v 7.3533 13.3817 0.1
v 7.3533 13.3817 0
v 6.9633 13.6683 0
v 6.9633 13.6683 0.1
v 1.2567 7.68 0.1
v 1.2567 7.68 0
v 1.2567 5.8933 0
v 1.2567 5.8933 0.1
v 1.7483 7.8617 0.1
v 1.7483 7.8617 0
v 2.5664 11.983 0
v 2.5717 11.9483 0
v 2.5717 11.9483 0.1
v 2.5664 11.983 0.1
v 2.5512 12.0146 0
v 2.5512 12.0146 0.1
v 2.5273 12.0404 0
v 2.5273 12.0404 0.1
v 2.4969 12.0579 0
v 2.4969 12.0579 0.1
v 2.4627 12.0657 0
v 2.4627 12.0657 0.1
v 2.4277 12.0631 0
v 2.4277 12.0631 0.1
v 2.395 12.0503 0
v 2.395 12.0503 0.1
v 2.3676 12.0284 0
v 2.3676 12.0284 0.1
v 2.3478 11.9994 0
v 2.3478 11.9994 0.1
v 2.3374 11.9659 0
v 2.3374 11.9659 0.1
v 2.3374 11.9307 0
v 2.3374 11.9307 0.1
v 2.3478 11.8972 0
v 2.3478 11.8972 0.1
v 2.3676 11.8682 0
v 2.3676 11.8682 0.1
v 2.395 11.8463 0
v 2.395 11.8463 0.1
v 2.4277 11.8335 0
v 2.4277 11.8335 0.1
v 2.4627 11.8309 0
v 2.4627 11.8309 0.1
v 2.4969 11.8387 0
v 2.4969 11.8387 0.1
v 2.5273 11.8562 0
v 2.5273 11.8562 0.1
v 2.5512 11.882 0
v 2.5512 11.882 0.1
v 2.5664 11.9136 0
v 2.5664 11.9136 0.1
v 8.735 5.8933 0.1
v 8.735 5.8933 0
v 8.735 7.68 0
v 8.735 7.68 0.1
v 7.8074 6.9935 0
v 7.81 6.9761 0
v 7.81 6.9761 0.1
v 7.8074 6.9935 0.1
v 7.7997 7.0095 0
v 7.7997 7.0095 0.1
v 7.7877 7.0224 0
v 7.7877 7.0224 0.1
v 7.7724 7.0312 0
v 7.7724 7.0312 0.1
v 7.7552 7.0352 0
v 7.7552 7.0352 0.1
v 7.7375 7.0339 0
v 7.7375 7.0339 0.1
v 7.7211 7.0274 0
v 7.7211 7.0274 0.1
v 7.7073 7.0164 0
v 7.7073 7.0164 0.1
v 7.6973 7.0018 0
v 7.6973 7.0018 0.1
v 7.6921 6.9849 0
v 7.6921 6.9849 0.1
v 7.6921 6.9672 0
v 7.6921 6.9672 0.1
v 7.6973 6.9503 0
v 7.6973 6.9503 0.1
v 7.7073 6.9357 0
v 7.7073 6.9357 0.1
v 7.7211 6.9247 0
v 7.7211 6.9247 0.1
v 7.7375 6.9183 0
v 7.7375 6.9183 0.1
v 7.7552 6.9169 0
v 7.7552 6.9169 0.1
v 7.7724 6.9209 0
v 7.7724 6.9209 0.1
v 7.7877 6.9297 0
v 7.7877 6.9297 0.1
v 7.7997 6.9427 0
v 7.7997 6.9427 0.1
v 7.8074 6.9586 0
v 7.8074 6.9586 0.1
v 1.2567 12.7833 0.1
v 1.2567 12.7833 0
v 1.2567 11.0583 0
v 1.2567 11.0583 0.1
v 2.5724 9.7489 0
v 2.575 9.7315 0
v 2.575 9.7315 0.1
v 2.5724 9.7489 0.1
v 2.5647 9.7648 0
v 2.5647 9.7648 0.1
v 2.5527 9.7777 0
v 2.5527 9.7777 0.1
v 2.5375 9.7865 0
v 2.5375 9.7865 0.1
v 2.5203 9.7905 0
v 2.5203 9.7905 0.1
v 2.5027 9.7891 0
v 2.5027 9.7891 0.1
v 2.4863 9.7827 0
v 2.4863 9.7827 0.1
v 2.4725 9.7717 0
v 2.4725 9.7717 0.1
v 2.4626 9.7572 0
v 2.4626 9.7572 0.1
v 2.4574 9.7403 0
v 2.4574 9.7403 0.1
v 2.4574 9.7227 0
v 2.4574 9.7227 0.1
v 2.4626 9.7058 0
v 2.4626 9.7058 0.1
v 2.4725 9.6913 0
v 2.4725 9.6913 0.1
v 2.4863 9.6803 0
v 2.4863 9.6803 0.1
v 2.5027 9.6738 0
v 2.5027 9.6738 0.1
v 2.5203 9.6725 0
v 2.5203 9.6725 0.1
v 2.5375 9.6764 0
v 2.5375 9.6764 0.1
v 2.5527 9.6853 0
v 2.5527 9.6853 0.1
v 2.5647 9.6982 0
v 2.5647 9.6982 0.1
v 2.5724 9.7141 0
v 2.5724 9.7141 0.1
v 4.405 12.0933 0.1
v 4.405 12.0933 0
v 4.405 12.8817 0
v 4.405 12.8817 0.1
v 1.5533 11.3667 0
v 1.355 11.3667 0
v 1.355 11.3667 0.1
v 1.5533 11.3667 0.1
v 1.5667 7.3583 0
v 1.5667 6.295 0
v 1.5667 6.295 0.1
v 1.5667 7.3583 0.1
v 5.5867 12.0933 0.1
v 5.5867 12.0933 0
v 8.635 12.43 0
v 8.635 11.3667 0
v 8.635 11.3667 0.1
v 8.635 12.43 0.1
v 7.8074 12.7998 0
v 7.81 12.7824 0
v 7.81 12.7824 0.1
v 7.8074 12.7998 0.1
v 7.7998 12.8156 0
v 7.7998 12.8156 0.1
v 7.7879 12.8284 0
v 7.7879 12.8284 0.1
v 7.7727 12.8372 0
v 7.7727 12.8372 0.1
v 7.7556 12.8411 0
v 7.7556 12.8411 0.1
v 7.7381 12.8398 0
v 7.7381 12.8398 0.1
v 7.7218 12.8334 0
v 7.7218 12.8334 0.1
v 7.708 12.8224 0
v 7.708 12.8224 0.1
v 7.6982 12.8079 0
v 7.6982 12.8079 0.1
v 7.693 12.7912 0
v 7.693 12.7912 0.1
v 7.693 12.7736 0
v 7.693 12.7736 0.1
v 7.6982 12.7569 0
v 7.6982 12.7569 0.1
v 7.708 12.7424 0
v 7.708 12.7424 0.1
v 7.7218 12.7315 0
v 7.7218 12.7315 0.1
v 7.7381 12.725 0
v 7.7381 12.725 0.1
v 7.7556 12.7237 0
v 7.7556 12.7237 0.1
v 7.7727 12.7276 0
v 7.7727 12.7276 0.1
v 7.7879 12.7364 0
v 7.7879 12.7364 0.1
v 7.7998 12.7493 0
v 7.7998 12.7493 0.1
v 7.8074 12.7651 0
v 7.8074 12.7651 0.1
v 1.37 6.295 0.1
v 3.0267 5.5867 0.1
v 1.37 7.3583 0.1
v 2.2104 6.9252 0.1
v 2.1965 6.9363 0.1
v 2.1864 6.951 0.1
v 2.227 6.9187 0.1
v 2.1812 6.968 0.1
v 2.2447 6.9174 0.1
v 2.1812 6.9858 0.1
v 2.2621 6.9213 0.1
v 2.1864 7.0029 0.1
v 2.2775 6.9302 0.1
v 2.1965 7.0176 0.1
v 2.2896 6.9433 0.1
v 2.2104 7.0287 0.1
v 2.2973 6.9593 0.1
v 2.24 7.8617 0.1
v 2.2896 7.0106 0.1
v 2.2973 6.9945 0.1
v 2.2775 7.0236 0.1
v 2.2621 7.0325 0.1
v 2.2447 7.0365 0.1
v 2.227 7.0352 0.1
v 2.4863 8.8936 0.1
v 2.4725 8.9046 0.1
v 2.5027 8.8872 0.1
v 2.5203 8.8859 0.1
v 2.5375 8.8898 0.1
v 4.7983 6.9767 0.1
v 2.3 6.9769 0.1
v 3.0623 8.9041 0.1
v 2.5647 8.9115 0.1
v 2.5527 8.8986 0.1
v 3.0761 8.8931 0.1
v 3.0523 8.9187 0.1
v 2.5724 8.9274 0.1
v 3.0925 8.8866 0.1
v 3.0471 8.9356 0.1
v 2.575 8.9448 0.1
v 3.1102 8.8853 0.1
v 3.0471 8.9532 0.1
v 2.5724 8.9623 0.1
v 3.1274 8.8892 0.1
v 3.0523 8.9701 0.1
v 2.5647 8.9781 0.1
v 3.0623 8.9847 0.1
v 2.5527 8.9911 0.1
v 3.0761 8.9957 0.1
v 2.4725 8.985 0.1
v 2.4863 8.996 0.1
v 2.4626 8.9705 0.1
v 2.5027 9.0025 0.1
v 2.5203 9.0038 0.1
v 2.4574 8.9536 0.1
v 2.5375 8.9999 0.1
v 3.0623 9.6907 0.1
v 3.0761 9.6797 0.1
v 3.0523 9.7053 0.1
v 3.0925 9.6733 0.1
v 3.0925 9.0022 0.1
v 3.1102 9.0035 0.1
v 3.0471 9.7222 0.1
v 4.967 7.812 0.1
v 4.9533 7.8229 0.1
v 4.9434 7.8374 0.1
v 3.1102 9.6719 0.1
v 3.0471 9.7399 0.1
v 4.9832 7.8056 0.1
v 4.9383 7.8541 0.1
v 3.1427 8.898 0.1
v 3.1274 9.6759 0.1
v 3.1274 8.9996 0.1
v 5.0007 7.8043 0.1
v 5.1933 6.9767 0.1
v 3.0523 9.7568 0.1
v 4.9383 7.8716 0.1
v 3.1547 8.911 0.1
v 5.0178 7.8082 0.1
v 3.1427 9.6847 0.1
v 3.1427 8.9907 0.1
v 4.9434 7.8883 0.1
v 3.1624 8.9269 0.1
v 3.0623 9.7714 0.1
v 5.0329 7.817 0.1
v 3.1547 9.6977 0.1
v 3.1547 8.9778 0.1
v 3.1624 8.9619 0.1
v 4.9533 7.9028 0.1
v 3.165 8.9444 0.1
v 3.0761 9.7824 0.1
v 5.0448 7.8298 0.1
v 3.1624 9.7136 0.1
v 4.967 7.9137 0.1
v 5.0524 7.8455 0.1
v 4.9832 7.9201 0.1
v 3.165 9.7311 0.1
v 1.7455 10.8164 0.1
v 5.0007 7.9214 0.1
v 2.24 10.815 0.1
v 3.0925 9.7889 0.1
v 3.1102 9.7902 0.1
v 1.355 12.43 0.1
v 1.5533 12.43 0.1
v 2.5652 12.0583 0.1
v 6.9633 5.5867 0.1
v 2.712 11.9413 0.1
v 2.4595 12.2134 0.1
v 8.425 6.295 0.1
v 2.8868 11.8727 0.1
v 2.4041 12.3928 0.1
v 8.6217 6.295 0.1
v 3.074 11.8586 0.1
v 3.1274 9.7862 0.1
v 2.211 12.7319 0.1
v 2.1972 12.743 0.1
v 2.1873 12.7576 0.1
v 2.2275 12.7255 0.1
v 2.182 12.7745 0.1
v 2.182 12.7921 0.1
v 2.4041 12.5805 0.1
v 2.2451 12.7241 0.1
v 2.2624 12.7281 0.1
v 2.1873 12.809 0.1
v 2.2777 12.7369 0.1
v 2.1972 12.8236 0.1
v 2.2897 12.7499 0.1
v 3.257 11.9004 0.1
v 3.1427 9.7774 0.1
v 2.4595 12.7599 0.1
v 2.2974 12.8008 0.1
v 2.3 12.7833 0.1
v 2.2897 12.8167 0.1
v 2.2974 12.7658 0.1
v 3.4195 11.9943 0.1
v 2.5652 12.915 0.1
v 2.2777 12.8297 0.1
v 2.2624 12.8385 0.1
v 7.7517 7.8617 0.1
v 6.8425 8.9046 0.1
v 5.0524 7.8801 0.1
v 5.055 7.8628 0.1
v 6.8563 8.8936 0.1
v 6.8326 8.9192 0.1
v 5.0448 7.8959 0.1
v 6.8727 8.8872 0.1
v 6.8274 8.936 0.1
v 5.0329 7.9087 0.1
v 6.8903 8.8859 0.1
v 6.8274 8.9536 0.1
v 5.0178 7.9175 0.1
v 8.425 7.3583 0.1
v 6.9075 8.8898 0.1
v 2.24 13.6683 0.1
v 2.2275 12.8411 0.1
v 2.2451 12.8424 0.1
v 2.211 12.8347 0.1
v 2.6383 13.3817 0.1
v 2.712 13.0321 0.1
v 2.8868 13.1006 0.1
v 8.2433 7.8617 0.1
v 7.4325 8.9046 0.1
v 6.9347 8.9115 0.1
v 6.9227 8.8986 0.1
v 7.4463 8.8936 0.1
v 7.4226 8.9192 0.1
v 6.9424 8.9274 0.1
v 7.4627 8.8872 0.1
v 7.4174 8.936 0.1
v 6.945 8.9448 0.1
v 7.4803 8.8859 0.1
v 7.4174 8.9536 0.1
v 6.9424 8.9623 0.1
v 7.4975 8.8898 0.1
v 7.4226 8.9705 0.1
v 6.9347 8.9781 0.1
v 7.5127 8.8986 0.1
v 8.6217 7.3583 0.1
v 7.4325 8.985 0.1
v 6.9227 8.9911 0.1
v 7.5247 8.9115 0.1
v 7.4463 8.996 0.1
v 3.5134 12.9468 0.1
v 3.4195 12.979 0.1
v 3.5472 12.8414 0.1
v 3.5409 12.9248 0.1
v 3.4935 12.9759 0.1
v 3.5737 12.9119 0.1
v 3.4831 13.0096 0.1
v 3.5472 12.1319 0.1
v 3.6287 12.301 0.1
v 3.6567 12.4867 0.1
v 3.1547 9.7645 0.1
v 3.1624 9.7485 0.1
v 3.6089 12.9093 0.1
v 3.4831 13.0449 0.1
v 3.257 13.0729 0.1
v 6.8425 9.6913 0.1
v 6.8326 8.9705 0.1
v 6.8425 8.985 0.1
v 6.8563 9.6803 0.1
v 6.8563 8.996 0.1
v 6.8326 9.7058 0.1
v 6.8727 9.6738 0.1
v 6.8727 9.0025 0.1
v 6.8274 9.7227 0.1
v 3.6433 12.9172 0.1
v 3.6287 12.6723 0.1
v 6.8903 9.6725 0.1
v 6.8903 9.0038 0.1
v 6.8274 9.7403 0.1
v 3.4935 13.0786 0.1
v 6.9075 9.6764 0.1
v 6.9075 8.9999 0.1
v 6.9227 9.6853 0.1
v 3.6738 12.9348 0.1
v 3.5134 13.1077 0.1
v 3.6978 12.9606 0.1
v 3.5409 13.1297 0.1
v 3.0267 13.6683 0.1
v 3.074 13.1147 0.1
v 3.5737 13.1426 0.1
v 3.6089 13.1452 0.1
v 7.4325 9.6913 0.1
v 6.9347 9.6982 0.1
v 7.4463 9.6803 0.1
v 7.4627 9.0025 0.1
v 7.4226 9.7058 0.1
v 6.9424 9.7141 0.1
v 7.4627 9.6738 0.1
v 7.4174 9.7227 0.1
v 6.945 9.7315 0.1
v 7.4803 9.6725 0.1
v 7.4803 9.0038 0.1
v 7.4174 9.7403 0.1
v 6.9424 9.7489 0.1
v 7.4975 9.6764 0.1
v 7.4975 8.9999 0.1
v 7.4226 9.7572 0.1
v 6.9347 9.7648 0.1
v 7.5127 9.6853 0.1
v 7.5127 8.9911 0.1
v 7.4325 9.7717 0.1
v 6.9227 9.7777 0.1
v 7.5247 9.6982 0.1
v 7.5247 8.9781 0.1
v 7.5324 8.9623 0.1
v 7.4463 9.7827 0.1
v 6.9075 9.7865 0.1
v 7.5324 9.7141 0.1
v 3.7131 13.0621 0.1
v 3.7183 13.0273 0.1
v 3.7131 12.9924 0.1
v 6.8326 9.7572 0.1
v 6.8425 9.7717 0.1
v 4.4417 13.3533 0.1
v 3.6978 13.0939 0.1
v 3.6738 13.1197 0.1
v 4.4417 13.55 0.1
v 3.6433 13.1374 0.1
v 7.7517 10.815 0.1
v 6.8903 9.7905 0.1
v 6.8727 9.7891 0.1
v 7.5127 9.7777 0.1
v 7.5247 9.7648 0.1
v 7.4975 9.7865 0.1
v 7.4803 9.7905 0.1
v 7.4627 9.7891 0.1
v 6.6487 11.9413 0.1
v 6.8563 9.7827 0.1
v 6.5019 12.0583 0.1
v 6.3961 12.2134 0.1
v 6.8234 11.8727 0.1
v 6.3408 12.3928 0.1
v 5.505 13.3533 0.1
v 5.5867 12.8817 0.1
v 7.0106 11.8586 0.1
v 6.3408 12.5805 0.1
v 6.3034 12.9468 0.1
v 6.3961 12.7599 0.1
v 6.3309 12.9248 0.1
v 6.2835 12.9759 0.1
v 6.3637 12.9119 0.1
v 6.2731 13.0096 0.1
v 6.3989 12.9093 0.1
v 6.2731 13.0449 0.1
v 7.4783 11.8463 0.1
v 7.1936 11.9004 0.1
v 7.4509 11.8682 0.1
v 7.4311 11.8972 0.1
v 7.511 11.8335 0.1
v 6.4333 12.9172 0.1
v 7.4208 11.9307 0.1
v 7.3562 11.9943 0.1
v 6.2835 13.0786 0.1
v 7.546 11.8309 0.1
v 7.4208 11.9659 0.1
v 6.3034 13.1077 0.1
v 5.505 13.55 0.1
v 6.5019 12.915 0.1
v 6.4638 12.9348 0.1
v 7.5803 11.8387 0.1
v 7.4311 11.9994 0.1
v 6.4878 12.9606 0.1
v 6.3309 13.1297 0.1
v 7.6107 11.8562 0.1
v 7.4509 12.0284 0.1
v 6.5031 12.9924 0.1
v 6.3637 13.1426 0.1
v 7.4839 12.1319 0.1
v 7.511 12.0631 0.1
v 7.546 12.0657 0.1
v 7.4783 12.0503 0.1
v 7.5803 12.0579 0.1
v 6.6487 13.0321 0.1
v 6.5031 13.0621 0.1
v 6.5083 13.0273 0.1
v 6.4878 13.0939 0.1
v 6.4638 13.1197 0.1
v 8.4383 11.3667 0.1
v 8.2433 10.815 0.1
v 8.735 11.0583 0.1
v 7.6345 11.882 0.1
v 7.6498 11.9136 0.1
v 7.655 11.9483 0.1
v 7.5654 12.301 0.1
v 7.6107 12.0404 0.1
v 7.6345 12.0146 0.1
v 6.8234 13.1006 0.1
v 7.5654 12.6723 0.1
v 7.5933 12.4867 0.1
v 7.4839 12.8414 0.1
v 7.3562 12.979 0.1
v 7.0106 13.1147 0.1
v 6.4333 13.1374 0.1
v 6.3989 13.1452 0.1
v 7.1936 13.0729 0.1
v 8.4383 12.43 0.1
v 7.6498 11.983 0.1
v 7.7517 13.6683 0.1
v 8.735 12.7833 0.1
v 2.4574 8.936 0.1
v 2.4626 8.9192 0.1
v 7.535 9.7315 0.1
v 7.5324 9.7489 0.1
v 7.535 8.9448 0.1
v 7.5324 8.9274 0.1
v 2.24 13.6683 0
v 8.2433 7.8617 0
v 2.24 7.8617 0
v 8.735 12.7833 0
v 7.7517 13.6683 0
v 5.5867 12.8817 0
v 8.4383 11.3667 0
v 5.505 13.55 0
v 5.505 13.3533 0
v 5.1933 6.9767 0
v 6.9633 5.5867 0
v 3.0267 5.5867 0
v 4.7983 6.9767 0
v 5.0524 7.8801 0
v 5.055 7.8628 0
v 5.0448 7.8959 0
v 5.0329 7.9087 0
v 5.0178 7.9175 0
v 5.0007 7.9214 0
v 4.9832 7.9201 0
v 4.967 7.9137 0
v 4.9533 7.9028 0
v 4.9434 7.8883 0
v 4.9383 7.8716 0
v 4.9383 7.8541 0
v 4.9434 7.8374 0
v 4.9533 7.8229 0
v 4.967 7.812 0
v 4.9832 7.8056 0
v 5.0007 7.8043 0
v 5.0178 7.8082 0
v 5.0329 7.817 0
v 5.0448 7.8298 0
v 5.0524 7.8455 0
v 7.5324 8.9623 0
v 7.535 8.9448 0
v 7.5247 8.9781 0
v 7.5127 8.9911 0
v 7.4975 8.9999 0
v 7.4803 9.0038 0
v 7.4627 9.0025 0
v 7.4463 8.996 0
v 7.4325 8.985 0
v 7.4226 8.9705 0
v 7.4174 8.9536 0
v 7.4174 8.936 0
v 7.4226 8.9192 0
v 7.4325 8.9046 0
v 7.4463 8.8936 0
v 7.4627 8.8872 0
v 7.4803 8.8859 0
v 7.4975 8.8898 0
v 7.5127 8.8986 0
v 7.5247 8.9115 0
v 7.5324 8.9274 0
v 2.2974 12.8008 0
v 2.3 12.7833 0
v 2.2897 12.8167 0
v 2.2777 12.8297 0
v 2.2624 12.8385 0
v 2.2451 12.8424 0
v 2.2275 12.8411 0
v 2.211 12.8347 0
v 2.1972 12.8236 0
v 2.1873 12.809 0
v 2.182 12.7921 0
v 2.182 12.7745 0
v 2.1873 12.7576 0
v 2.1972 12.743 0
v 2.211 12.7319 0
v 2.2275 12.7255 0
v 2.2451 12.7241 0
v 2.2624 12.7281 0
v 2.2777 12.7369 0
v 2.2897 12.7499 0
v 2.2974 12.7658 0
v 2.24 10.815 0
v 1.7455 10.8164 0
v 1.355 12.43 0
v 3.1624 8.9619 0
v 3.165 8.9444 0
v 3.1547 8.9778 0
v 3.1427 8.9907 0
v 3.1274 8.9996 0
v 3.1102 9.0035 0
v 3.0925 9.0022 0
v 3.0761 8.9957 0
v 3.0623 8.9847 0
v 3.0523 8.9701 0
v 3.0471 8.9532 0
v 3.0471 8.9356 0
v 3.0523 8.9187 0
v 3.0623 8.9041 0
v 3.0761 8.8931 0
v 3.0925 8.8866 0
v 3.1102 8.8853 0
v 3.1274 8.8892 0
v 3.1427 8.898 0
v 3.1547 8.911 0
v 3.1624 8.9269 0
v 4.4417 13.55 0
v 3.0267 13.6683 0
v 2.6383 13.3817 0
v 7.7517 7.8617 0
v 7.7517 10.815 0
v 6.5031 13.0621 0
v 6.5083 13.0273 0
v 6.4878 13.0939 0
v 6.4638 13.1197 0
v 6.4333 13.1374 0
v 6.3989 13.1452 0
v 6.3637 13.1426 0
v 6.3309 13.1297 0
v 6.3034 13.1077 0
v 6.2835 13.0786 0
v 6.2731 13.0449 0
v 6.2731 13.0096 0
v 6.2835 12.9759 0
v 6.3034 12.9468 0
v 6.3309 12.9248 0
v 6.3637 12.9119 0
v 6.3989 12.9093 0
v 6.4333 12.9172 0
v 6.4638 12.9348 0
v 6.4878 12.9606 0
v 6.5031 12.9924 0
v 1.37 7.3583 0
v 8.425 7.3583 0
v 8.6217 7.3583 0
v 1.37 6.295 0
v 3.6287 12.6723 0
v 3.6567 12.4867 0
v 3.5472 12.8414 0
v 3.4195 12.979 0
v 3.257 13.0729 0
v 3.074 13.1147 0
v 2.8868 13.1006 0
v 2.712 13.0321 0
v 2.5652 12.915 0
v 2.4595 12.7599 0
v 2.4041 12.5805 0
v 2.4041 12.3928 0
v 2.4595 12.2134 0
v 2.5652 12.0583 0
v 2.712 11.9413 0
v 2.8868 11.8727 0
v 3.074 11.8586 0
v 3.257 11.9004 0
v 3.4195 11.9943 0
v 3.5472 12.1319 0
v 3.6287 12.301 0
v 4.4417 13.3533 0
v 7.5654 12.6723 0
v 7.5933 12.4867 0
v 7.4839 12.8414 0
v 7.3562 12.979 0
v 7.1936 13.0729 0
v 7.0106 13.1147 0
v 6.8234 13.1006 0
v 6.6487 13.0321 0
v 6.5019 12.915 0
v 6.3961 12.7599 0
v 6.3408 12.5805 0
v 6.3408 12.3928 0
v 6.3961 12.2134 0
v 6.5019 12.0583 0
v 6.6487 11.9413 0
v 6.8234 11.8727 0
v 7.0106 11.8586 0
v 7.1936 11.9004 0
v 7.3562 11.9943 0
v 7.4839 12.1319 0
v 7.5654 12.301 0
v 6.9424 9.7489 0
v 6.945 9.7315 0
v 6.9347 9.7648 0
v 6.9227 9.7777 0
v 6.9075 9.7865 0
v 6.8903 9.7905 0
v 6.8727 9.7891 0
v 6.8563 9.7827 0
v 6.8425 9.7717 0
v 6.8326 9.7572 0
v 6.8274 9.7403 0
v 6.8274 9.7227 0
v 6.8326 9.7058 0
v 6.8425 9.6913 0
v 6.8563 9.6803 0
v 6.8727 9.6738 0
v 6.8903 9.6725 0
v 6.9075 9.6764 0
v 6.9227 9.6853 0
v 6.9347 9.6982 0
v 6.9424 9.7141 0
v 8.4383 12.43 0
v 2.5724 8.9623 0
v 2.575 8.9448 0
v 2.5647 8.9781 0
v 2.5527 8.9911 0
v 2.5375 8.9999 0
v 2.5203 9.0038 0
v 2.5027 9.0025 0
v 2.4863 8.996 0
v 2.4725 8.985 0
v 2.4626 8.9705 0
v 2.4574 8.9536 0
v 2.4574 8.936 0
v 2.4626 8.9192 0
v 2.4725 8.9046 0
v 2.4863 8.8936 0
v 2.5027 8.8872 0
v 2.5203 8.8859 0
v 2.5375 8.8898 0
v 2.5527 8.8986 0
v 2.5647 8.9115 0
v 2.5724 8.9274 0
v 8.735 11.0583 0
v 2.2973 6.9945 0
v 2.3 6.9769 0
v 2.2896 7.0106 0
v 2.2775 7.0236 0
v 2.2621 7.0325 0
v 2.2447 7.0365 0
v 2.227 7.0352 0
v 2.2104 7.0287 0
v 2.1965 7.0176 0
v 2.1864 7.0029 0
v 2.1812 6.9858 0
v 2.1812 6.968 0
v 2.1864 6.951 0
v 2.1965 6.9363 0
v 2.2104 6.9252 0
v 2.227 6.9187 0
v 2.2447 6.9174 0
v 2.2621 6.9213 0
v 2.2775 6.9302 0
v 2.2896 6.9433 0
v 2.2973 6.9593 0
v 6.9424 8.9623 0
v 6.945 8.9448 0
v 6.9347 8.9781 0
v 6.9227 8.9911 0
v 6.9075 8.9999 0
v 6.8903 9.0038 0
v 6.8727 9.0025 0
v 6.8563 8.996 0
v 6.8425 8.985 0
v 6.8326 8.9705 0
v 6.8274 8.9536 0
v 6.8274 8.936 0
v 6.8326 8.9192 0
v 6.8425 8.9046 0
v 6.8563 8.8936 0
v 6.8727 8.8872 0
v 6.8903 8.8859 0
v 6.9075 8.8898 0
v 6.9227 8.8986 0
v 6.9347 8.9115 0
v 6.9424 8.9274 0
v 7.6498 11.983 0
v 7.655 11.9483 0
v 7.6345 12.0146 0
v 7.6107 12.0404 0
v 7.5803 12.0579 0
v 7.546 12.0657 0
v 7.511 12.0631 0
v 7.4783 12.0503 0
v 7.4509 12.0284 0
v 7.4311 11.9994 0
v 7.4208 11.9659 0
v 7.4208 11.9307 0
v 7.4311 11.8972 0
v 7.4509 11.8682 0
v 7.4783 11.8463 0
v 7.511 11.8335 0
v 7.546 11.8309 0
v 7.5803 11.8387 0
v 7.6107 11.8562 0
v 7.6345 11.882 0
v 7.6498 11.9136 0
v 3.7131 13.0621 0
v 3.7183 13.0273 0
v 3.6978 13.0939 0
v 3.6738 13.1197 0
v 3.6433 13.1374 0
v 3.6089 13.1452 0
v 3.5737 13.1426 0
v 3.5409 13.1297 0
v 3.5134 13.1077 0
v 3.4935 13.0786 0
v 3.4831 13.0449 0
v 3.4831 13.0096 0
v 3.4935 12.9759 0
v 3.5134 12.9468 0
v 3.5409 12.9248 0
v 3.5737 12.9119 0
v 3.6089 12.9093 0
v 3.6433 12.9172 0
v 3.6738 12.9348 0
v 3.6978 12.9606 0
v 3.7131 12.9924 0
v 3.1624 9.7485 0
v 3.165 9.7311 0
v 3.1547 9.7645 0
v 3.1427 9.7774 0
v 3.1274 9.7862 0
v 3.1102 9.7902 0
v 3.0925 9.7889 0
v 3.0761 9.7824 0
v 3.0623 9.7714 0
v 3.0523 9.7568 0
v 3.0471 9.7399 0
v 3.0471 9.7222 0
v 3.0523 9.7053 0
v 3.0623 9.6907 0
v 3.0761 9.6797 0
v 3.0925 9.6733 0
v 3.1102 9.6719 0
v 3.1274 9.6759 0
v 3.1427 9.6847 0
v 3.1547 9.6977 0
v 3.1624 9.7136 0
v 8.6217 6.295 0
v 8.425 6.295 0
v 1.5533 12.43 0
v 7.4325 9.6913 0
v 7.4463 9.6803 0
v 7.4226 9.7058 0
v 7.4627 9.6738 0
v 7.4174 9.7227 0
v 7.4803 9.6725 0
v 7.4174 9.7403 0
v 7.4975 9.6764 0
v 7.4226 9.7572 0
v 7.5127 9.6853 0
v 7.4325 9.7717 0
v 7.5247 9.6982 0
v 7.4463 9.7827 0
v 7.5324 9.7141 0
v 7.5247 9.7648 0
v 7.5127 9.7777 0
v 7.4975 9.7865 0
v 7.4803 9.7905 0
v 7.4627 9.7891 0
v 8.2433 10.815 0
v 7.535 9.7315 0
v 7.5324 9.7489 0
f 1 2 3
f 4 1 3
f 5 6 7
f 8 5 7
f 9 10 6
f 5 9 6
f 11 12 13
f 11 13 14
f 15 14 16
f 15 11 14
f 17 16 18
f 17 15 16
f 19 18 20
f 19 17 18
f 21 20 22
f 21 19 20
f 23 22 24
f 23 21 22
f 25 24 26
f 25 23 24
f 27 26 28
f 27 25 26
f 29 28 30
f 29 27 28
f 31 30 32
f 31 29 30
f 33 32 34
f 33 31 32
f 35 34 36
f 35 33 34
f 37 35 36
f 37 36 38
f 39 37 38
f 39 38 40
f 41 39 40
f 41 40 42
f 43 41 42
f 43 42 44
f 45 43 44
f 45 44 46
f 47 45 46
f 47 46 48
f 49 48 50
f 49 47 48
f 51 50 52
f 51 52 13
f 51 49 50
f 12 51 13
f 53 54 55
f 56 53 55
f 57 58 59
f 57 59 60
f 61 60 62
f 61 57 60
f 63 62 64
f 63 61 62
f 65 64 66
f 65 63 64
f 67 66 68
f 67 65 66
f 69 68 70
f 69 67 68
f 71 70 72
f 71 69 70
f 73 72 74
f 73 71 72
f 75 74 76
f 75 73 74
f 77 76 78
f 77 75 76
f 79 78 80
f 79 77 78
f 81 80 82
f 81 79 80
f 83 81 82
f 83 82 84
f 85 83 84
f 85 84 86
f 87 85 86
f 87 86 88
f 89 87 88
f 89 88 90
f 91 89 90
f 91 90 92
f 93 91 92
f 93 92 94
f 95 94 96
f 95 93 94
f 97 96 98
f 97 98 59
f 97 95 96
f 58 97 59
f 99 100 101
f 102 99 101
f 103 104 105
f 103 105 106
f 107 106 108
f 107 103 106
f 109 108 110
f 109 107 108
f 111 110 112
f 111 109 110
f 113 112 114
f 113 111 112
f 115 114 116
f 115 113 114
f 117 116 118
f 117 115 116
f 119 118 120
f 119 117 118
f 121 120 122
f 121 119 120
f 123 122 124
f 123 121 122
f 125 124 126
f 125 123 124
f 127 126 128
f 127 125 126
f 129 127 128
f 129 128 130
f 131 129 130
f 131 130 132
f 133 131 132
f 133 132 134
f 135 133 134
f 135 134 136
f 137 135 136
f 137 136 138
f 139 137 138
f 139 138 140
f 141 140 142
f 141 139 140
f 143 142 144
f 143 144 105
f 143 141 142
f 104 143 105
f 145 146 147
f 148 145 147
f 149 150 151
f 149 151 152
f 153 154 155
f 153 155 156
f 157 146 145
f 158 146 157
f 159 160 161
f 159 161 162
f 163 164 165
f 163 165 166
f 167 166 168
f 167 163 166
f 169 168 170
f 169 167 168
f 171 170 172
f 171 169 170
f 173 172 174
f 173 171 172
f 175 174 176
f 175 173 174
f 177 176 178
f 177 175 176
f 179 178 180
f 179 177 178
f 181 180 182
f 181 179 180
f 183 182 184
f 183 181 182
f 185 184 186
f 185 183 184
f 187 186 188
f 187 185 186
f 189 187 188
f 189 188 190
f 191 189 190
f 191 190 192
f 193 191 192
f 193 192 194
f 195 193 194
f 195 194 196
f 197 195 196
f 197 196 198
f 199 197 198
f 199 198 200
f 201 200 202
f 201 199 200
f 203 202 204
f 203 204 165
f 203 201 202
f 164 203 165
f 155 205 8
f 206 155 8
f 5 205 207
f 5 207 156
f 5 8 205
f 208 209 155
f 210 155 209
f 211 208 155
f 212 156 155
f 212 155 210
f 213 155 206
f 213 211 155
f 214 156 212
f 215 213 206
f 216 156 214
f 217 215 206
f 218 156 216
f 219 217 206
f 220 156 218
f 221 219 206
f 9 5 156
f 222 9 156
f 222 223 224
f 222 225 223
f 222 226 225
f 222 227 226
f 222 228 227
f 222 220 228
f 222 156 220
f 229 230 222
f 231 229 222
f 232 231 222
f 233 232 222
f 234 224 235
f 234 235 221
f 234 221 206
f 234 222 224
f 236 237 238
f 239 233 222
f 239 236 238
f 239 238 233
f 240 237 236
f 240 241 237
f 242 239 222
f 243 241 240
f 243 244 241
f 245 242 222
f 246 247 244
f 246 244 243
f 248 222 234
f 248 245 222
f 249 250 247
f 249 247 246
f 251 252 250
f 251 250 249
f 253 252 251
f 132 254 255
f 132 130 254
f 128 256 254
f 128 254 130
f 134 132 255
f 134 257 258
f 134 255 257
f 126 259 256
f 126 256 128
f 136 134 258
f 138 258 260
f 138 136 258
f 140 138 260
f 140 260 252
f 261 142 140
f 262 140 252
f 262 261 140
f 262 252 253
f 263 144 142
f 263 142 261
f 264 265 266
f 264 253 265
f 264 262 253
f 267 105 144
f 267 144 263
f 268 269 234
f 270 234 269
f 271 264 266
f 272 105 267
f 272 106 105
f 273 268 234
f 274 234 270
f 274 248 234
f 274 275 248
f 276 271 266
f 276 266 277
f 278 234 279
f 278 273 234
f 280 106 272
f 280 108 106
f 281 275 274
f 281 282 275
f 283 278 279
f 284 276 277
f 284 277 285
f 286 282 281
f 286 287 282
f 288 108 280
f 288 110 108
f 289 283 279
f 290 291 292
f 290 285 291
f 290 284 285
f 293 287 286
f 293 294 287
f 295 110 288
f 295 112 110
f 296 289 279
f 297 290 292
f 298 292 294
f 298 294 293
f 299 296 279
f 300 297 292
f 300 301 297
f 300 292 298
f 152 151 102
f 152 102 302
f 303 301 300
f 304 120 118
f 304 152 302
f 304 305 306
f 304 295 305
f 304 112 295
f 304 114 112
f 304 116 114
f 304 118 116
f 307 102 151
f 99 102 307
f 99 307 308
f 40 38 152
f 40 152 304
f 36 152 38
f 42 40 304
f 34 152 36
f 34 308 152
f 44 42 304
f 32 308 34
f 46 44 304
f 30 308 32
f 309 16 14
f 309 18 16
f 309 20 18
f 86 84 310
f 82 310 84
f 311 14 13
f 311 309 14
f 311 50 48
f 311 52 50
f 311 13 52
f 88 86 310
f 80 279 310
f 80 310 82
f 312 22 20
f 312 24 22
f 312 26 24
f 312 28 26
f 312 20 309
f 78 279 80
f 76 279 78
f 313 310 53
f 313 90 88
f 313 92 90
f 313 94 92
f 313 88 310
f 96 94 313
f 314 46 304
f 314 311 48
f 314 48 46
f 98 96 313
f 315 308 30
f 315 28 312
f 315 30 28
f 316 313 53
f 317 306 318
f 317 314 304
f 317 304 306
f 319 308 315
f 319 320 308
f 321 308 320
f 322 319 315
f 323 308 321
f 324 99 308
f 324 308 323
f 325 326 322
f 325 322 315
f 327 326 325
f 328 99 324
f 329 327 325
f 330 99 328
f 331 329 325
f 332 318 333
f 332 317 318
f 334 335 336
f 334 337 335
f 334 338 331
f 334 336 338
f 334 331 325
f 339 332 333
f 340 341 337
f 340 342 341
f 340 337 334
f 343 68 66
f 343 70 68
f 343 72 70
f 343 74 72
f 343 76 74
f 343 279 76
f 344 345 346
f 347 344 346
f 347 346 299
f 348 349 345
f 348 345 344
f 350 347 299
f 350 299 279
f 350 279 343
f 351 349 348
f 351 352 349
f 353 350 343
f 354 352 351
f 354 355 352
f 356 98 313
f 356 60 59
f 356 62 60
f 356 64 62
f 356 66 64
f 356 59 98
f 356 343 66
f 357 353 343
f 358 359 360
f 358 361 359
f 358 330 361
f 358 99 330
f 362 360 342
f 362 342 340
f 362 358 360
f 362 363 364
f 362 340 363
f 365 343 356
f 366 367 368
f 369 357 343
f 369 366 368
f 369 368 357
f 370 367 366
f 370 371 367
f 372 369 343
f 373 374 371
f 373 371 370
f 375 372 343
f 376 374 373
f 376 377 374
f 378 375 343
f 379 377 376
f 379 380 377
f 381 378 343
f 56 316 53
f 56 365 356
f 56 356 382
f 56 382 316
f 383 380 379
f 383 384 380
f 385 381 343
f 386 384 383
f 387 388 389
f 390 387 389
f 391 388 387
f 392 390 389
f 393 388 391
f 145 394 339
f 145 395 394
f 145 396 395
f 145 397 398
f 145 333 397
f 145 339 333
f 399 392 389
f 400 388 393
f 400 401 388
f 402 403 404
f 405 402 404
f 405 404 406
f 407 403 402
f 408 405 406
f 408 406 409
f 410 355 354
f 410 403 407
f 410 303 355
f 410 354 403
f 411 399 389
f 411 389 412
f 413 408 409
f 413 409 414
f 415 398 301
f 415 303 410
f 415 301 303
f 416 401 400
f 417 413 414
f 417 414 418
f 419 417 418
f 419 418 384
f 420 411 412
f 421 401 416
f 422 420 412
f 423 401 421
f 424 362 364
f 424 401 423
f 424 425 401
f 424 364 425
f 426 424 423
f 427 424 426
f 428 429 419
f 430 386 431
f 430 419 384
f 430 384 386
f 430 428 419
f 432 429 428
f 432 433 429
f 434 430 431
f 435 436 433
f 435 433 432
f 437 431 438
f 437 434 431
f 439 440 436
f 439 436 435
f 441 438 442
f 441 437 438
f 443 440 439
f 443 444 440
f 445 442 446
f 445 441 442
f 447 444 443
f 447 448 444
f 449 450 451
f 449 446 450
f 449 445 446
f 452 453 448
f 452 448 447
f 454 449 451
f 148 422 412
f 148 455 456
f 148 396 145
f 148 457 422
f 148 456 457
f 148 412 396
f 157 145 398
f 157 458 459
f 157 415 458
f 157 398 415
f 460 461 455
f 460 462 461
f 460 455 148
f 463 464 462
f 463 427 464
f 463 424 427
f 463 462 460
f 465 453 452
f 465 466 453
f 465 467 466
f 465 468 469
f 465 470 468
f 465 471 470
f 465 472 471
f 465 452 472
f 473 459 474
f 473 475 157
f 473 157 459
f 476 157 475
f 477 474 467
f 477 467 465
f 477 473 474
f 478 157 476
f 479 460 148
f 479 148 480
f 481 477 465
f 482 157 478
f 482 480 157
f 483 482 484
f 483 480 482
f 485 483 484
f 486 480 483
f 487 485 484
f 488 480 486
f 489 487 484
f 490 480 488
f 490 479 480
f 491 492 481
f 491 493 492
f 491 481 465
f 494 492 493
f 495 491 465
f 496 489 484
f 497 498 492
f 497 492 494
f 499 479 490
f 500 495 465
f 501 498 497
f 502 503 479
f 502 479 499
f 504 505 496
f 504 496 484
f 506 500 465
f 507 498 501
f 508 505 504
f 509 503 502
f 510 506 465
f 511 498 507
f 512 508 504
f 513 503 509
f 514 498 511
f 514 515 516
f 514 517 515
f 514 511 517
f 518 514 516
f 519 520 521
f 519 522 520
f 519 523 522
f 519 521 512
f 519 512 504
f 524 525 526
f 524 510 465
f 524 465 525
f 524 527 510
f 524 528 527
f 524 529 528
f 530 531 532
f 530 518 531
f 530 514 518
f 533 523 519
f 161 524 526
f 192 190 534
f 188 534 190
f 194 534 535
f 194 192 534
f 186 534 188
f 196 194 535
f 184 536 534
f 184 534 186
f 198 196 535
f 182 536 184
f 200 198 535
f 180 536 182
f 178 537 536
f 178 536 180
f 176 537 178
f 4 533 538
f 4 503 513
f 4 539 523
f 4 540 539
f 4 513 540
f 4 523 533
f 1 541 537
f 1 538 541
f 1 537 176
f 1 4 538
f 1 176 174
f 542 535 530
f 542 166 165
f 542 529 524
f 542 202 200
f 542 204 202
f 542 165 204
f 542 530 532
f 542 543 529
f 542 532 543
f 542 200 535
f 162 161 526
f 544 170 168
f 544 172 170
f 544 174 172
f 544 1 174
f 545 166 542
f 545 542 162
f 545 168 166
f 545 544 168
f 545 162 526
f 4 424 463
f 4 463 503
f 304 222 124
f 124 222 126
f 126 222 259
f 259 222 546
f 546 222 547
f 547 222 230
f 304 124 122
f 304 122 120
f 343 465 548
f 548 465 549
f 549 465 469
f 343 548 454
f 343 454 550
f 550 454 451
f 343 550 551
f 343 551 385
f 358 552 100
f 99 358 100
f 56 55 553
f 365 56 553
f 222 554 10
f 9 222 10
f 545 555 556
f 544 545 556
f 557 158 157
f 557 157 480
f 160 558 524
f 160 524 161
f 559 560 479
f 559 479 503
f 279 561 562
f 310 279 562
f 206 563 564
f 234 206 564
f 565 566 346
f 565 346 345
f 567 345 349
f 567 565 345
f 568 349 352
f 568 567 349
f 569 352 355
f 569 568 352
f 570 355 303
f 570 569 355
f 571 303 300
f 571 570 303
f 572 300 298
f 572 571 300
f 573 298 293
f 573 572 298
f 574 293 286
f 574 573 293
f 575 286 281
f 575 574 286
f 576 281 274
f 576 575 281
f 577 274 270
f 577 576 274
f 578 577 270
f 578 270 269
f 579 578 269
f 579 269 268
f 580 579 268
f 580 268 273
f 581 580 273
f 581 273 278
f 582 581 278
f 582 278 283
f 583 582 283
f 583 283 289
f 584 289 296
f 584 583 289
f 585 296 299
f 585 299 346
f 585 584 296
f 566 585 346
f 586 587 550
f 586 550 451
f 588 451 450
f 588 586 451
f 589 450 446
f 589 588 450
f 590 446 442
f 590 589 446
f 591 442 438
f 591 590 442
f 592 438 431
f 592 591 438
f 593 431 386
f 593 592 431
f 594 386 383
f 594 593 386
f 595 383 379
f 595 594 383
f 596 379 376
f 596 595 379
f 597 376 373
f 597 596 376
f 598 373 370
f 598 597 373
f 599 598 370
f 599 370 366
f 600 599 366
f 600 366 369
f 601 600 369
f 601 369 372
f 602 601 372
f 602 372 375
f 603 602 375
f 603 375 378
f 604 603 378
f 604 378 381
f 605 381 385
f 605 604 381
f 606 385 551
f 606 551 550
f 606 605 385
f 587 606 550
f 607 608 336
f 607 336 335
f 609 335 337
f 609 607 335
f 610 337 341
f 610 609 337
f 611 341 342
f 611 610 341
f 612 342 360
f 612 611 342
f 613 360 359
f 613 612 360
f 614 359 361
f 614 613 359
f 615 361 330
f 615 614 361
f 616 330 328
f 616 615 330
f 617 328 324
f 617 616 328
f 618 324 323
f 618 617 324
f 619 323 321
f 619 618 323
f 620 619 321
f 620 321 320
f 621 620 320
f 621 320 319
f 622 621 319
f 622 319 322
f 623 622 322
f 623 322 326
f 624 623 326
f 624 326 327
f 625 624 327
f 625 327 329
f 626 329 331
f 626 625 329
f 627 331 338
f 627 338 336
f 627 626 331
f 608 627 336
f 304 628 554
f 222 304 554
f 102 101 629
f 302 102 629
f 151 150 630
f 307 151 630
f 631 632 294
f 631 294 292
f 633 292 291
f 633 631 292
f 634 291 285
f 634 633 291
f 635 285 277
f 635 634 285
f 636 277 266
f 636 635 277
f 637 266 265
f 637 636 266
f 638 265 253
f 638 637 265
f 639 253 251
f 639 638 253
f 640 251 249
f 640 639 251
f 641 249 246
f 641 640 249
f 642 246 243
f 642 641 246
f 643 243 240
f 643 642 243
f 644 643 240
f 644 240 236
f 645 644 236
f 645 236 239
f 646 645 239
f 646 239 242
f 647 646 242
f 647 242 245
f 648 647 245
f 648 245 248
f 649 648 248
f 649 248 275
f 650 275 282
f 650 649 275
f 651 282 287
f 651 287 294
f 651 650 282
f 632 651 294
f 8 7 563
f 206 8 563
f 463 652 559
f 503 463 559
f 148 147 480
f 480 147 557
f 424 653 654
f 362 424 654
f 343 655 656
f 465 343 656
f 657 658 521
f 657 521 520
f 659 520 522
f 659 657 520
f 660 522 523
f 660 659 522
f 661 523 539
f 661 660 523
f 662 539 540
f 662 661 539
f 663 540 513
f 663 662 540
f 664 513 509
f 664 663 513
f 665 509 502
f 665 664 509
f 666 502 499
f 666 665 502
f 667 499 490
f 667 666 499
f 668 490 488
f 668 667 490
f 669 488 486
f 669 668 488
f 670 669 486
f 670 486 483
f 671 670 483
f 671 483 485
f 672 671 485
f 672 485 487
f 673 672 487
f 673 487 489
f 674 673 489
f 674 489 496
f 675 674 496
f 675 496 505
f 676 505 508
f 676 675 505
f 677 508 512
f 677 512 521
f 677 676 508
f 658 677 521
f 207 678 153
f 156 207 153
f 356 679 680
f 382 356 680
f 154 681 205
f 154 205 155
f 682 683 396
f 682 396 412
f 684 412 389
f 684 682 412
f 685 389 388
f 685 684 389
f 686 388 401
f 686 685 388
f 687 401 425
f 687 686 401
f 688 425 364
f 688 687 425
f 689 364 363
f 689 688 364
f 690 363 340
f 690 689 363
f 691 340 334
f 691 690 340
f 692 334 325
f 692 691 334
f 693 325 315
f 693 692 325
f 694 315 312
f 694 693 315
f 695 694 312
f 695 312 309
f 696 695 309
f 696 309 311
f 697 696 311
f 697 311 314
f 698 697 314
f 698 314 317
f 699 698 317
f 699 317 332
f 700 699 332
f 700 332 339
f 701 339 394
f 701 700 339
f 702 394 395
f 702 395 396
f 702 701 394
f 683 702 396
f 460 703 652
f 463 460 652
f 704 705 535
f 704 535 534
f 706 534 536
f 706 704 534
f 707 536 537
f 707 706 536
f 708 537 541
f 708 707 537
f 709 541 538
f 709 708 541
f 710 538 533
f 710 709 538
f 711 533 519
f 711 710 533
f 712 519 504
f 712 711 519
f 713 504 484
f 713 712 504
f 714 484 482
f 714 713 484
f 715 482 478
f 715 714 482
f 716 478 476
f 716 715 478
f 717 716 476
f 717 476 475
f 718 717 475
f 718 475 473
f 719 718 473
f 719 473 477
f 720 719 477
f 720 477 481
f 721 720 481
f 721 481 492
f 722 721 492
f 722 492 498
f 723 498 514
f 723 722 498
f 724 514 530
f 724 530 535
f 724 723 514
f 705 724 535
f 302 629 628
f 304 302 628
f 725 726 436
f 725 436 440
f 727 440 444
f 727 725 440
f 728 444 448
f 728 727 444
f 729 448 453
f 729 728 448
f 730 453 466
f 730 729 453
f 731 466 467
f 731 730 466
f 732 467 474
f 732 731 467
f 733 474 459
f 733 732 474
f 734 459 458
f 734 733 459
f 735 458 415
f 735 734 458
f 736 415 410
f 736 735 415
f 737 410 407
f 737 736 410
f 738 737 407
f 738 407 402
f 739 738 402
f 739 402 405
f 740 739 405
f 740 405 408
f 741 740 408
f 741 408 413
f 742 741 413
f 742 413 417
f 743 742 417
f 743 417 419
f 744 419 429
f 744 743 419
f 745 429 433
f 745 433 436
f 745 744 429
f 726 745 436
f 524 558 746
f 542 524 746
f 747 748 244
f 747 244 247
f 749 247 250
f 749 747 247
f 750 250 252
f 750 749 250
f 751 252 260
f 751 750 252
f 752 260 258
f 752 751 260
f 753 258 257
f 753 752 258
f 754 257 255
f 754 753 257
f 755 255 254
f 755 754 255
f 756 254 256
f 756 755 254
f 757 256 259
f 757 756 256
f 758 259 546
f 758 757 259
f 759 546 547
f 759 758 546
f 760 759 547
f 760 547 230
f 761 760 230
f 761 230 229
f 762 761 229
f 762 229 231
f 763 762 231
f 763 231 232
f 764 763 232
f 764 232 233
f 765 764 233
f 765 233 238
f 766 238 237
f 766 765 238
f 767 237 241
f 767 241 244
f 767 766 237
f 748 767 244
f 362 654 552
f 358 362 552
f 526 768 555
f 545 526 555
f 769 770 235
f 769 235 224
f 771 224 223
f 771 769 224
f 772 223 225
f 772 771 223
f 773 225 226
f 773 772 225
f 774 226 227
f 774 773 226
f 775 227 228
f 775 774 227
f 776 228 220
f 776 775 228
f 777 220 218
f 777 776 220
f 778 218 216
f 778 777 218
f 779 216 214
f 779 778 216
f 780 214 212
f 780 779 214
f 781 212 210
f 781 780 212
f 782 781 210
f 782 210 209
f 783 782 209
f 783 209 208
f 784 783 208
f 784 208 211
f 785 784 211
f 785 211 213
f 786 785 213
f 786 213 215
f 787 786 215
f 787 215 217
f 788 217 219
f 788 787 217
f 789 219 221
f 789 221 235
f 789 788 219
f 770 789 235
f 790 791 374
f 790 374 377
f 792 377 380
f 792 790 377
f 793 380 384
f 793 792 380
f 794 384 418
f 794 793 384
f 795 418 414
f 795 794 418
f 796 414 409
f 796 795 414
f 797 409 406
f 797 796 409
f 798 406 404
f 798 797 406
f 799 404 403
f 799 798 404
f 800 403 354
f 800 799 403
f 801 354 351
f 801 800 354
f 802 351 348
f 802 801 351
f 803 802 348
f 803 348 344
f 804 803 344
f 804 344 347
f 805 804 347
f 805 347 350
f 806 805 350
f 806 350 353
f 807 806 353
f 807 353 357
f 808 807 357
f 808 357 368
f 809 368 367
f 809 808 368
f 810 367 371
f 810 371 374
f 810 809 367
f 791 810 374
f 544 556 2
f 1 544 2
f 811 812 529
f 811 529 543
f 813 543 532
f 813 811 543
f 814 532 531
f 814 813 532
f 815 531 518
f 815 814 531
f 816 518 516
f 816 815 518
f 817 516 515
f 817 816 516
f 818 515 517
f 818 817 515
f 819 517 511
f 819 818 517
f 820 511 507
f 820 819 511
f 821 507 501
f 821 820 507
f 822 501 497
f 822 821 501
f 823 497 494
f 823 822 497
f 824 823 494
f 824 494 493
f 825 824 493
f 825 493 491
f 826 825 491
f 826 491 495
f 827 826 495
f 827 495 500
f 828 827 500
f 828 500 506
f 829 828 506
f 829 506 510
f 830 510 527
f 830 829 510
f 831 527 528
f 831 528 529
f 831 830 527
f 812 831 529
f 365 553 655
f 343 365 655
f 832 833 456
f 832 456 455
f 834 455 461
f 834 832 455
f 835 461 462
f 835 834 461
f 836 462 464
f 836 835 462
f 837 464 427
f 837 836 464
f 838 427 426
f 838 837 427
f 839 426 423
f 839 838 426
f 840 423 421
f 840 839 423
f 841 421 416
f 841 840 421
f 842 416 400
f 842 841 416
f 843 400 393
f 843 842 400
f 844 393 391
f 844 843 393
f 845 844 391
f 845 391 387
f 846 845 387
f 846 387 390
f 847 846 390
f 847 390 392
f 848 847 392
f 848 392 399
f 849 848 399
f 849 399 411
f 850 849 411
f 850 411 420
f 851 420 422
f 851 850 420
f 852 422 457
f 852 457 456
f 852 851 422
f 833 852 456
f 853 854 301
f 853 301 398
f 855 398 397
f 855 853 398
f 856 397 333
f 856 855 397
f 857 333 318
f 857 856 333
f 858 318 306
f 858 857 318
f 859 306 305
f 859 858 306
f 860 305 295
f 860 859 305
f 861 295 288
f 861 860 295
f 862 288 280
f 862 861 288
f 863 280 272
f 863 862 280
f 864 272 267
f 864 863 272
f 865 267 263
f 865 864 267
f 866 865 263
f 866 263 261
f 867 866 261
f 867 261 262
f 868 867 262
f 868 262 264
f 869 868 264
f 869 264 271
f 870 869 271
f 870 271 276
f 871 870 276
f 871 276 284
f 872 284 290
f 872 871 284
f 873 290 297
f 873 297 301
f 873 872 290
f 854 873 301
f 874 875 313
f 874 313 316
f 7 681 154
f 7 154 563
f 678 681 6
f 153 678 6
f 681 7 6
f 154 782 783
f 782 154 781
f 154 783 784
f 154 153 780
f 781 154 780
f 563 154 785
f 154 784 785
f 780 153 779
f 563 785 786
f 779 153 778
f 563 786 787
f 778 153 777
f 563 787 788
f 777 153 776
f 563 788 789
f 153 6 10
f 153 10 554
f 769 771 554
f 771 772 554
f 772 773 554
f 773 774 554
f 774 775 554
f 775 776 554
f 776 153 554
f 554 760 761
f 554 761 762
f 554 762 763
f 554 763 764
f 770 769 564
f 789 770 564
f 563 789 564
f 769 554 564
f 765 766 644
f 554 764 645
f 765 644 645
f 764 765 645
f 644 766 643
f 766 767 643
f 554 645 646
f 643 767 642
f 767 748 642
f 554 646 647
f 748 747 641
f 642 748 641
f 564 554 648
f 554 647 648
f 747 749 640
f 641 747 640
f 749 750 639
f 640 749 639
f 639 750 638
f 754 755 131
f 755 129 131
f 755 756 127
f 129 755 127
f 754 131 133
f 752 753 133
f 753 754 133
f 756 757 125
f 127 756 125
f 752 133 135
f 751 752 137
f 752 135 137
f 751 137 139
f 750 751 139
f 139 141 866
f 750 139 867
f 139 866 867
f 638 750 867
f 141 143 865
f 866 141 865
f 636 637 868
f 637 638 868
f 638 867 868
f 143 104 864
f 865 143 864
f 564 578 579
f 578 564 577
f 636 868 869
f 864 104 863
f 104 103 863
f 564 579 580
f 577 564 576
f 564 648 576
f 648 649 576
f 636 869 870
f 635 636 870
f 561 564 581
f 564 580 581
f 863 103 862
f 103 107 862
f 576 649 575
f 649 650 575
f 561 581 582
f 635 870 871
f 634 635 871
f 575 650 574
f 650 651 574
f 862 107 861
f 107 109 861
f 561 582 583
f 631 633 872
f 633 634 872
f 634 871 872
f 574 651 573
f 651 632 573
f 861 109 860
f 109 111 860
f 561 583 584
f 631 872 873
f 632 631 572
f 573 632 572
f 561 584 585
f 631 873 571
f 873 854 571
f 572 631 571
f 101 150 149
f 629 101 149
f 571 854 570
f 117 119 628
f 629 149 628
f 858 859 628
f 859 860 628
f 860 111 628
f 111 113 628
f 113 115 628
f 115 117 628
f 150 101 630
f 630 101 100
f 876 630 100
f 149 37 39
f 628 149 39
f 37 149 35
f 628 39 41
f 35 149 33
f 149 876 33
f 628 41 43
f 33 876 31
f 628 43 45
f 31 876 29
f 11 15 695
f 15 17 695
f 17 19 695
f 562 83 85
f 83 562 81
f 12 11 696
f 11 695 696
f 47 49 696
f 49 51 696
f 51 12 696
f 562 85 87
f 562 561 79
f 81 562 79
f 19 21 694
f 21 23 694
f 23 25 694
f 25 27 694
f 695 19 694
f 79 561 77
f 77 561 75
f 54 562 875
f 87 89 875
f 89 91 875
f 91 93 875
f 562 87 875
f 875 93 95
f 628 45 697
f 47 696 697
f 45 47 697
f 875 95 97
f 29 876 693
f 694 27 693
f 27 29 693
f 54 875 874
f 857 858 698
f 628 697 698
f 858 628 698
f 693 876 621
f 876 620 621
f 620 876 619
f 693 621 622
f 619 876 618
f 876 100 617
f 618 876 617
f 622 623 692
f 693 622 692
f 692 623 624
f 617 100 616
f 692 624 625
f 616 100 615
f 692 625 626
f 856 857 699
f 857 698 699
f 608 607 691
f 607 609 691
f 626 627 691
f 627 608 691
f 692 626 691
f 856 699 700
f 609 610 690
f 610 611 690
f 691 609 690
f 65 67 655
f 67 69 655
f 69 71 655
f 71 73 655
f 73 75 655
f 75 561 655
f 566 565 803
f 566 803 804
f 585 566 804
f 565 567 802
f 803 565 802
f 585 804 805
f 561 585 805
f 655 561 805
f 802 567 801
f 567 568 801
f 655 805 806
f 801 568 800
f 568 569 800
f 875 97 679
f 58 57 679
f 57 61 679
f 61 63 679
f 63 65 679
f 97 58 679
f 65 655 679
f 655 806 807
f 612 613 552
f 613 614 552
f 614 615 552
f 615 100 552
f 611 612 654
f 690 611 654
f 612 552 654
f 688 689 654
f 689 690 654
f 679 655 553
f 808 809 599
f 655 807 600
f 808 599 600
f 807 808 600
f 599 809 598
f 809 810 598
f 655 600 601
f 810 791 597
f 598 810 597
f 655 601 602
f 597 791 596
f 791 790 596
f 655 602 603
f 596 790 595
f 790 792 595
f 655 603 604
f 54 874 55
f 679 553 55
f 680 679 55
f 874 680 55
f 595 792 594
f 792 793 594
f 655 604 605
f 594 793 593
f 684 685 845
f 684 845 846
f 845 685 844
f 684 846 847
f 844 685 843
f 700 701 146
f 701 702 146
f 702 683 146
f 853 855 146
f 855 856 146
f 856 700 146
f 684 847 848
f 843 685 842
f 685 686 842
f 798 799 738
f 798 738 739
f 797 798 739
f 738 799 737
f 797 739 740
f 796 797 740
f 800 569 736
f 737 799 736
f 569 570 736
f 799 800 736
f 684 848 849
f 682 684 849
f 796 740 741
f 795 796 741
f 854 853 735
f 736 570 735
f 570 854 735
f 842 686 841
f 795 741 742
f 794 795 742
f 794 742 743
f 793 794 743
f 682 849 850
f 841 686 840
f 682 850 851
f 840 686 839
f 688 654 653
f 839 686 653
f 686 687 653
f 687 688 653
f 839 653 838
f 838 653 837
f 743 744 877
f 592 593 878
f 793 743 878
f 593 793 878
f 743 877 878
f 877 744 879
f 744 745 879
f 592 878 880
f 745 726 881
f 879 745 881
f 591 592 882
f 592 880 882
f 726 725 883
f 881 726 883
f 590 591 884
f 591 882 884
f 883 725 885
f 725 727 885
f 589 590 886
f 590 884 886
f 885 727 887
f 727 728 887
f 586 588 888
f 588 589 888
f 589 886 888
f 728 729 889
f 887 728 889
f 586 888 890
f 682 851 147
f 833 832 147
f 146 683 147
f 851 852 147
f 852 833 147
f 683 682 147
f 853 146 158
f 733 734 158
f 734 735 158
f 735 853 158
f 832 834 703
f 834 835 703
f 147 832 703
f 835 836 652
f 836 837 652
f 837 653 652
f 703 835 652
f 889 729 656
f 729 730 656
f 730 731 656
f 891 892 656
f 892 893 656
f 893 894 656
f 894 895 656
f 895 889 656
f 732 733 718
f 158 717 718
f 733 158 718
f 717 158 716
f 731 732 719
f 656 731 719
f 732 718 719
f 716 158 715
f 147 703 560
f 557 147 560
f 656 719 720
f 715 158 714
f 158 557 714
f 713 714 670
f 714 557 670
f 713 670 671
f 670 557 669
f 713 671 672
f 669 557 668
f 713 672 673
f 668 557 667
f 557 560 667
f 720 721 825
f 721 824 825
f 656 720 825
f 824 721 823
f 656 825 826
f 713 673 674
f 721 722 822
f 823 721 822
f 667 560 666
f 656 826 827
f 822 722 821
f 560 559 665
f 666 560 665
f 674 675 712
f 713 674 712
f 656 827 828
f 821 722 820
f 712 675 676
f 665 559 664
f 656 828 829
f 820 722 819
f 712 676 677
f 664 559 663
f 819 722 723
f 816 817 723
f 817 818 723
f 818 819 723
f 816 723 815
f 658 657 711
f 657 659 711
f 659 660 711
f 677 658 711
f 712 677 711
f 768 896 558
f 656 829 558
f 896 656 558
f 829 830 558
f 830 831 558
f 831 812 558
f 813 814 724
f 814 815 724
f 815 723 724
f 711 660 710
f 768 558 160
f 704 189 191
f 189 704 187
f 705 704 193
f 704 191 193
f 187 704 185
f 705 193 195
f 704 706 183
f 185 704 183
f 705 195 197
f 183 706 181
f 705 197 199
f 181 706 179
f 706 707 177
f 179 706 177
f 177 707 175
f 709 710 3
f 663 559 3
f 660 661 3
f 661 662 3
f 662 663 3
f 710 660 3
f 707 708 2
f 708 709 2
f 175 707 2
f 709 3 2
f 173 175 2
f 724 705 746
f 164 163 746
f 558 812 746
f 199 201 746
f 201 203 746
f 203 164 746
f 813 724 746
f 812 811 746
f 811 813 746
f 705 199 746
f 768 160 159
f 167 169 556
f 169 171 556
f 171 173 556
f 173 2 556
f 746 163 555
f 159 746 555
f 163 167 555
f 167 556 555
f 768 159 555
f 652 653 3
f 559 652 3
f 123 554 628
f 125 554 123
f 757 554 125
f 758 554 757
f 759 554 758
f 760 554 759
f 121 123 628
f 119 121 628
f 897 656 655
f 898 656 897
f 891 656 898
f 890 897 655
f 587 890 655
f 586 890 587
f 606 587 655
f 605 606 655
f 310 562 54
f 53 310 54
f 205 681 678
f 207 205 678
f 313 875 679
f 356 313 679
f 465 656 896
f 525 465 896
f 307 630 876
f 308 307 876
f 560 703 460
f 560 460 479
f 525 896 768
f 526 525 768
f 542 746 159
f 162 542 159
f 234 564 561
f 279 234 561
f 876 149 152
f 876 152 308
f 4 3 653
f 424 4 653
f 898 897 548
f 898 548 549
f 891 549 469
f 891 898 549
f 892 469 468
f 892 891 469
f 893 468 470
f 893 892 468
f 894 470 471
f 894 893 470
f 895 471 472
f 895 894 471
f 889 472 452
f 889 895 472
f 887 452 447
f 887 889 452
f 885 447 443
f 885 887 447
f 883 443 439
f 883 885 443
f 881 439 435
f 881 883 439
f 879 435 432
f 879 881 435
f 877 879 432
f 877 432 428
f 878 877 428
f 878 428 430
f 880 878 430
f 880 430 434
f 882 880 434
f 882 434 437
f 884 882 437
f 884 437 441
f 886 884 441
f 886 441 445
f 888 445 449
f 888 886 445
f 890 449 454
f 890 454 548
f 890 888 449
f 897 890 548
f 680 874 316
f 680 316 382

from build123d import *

# Parameters (mm, degrees)
MODEL_W             = 0.196666719
MODEL_H             = 1.063333355
MODEL_R             = 0.059734003
MODEL_R_2           = 0.059132363
MODEL_R_3           = 0.058700681
MODEL_R_4           = 0.059278631
MODEL_W_2           = 0.198333417
MODEL_H_2           = 1.063332875
MODEL_R_5           = 0.117771094
MODEL_R_6           = 0.059308134
MODEL_R_7           = 0.629776797
MODEL_W_3           = 1.181666698
MODEL_H_3           = 0.788333261
MODEL_R_8           = 0.118273295
MODEL_W_4           = 1.06333351
MODEL_H_4           = 0.196666719
MODEL_W_5           = 0.196666718
MODEL_R_9           = 0.058837572
BOSS_EXTRUDE2_DEPTH = 0.1


with BuildPart() as part:
    # Model → Boss-Extrude2 (new body)
    with BuildSketch(Plane.XY):
        Polygon((8.243333021, 10.81500034), (8.73499949, 11.05833383), (8.73499949, 12.783333892), (7.751666542, 13.668334122), (7.353333302, 13.381667257), (6.963333125, 13.668333653), (3.026666479, 13.668333653), (2.63833299, 13.381667257), (2.239999688, 13.668334122), (1.256666333, 12.783333892), (1.256666333, 11.05833383), (1.745516576, 10.816394548), (2.23999976, 10.81500034), (2.239999604, 7.861666955), (1.748333052, 7.861667122), (1.256666333, 7.680000507), (1.256666333, 6.976667205), (1.256666333, 5.893333872), (3.026666313, 5.586667184), (4.798333, 6.976667205), (5.193333135, 6.976667205), (6.963333281, 5.586667184), (8.73499949, 5.893333872), (8.73499949, 6.976667205), (8.73499949, 7.680000507), (8.243333021, 7.861667122), (7.751666458, 7.861666955), (7.751666458, 8.851667372), (7.751666458, 9.825000726), (7.751666458, 10.81500033), align=None)
        with Locations((1.468333079, 6.826667195)):
            Rectangle(MODEL_W, MODEL_H, mode=Mode.SUBTRACT)
        with Locations((2.240266314, 6.976936858)):
            Circle(MODEL_R, mode=Mode.SUBTRACT)
        with Locations((2.515867534, 8.944828144)):
            Circle(MODEL_R_2, mode=Mode.SUBTRACT)
        with Locations((4.996310649, 7.8628457)):
            Circle(MODEL_R_3, mode=Mode.SUBTRACT)
        with Locations((3.105723982, 8.944391158)):
            Circle(MODEL_R_4, mode=Mode.SUBTRACT)
        with Locations((7.75072444, 6.976057752)):
            Circle(MODEL_R_4, mode=Mode.SUBTRACT)
        with Locations((8.523333068, 6.826667195)):
            Rectangle(MODEL_W, MODEL_H, mode=Mode.SUBTRACT)
        with Locations((6.88586742, 8.944828144)):
            Circle(MODEL_R_2, mode=Mode.SUBTRACT)
        with Locations((7.475867576, 8.944828144)):
            Circle(MODEL_R_2, mode=Mode.SUBTRACT)
        with Locations((2.515867534, 9.731494696)):
            Circle(MODEL_R_2, mode=Mode.SUBTRACT)
        with Locations((3.105723982, 9.73105771)):
            Circle(MODEL_R_4, mode=Mode.SUBTRACT)
        with Locations((1.454166407, 11.89833383)):
            Rectangle(MODEL_W_2, MODEL_H_2, mode=Mode.SUBTRACT)
        with Locations((2.453895151, 11.948297187)):
            Circle(MODEL_R_5, mode=Mode.SUBTRACT)
        with Locations((2.24069159, 12.783291009)):
            Circle(MODEL_R_6, mode=Mode.SUBTRACT)
        with Locations((3.026889474, 12.486656436)):
            Circle(MODEL_R_7, mode=Mode.SUBTRACT)
        with Locations((4.995833234, 12.487500794)):
            Rectangle(MODEL_W_3, MODEL_H_3, mode=Mode.SUBTRACT)
        with Locations((3.600060926, 13.027254837)):
            Circle(MODEL_R_8, mode=Mode.SUBTRACT)
        with Locations((4.97333288, 13.451667117)):
            Rectangle(MODEL_W_4, MODEL_H_4, mode=Mode.SUBTRACT)
        with Locations((6.88586742, 9.731494696)):
            Circle(MODEL_R_2, mode=Mode.SUBTRACT)
        with Locations((7.475867576, 9.731494696)):
            Circle(MODEL_R_2, mode=Mode.SUBTRACT)
        with Locations((6.963555964, 12.486656436)):
            Circle(MODEL_R_7, mode=Mode.SUBTRACT)
        with Locations((6.390061207, 13.027254837)):
            Circle(MODEL_R_8, mode=Mode.SUBTRACT)
        with Locations((7.537228797, 11.948297187)):
            Circle(MODEL_R_5, mode=Mode.SUBTRACT)
        with Locations((8.536666703, 11.89833383)):
            Rectangle(MODEL_W_5, MODEL_H_2, mode=Mode.SUBTRACT)
        with Locations((7.751169616, 12.782410364)):
            Circle(MODEL_R_9, mode=Mode.SUBTRACT)
    extrude(amount=BOSS_EXTRUDE2_DEPTH)


solid = part.part
